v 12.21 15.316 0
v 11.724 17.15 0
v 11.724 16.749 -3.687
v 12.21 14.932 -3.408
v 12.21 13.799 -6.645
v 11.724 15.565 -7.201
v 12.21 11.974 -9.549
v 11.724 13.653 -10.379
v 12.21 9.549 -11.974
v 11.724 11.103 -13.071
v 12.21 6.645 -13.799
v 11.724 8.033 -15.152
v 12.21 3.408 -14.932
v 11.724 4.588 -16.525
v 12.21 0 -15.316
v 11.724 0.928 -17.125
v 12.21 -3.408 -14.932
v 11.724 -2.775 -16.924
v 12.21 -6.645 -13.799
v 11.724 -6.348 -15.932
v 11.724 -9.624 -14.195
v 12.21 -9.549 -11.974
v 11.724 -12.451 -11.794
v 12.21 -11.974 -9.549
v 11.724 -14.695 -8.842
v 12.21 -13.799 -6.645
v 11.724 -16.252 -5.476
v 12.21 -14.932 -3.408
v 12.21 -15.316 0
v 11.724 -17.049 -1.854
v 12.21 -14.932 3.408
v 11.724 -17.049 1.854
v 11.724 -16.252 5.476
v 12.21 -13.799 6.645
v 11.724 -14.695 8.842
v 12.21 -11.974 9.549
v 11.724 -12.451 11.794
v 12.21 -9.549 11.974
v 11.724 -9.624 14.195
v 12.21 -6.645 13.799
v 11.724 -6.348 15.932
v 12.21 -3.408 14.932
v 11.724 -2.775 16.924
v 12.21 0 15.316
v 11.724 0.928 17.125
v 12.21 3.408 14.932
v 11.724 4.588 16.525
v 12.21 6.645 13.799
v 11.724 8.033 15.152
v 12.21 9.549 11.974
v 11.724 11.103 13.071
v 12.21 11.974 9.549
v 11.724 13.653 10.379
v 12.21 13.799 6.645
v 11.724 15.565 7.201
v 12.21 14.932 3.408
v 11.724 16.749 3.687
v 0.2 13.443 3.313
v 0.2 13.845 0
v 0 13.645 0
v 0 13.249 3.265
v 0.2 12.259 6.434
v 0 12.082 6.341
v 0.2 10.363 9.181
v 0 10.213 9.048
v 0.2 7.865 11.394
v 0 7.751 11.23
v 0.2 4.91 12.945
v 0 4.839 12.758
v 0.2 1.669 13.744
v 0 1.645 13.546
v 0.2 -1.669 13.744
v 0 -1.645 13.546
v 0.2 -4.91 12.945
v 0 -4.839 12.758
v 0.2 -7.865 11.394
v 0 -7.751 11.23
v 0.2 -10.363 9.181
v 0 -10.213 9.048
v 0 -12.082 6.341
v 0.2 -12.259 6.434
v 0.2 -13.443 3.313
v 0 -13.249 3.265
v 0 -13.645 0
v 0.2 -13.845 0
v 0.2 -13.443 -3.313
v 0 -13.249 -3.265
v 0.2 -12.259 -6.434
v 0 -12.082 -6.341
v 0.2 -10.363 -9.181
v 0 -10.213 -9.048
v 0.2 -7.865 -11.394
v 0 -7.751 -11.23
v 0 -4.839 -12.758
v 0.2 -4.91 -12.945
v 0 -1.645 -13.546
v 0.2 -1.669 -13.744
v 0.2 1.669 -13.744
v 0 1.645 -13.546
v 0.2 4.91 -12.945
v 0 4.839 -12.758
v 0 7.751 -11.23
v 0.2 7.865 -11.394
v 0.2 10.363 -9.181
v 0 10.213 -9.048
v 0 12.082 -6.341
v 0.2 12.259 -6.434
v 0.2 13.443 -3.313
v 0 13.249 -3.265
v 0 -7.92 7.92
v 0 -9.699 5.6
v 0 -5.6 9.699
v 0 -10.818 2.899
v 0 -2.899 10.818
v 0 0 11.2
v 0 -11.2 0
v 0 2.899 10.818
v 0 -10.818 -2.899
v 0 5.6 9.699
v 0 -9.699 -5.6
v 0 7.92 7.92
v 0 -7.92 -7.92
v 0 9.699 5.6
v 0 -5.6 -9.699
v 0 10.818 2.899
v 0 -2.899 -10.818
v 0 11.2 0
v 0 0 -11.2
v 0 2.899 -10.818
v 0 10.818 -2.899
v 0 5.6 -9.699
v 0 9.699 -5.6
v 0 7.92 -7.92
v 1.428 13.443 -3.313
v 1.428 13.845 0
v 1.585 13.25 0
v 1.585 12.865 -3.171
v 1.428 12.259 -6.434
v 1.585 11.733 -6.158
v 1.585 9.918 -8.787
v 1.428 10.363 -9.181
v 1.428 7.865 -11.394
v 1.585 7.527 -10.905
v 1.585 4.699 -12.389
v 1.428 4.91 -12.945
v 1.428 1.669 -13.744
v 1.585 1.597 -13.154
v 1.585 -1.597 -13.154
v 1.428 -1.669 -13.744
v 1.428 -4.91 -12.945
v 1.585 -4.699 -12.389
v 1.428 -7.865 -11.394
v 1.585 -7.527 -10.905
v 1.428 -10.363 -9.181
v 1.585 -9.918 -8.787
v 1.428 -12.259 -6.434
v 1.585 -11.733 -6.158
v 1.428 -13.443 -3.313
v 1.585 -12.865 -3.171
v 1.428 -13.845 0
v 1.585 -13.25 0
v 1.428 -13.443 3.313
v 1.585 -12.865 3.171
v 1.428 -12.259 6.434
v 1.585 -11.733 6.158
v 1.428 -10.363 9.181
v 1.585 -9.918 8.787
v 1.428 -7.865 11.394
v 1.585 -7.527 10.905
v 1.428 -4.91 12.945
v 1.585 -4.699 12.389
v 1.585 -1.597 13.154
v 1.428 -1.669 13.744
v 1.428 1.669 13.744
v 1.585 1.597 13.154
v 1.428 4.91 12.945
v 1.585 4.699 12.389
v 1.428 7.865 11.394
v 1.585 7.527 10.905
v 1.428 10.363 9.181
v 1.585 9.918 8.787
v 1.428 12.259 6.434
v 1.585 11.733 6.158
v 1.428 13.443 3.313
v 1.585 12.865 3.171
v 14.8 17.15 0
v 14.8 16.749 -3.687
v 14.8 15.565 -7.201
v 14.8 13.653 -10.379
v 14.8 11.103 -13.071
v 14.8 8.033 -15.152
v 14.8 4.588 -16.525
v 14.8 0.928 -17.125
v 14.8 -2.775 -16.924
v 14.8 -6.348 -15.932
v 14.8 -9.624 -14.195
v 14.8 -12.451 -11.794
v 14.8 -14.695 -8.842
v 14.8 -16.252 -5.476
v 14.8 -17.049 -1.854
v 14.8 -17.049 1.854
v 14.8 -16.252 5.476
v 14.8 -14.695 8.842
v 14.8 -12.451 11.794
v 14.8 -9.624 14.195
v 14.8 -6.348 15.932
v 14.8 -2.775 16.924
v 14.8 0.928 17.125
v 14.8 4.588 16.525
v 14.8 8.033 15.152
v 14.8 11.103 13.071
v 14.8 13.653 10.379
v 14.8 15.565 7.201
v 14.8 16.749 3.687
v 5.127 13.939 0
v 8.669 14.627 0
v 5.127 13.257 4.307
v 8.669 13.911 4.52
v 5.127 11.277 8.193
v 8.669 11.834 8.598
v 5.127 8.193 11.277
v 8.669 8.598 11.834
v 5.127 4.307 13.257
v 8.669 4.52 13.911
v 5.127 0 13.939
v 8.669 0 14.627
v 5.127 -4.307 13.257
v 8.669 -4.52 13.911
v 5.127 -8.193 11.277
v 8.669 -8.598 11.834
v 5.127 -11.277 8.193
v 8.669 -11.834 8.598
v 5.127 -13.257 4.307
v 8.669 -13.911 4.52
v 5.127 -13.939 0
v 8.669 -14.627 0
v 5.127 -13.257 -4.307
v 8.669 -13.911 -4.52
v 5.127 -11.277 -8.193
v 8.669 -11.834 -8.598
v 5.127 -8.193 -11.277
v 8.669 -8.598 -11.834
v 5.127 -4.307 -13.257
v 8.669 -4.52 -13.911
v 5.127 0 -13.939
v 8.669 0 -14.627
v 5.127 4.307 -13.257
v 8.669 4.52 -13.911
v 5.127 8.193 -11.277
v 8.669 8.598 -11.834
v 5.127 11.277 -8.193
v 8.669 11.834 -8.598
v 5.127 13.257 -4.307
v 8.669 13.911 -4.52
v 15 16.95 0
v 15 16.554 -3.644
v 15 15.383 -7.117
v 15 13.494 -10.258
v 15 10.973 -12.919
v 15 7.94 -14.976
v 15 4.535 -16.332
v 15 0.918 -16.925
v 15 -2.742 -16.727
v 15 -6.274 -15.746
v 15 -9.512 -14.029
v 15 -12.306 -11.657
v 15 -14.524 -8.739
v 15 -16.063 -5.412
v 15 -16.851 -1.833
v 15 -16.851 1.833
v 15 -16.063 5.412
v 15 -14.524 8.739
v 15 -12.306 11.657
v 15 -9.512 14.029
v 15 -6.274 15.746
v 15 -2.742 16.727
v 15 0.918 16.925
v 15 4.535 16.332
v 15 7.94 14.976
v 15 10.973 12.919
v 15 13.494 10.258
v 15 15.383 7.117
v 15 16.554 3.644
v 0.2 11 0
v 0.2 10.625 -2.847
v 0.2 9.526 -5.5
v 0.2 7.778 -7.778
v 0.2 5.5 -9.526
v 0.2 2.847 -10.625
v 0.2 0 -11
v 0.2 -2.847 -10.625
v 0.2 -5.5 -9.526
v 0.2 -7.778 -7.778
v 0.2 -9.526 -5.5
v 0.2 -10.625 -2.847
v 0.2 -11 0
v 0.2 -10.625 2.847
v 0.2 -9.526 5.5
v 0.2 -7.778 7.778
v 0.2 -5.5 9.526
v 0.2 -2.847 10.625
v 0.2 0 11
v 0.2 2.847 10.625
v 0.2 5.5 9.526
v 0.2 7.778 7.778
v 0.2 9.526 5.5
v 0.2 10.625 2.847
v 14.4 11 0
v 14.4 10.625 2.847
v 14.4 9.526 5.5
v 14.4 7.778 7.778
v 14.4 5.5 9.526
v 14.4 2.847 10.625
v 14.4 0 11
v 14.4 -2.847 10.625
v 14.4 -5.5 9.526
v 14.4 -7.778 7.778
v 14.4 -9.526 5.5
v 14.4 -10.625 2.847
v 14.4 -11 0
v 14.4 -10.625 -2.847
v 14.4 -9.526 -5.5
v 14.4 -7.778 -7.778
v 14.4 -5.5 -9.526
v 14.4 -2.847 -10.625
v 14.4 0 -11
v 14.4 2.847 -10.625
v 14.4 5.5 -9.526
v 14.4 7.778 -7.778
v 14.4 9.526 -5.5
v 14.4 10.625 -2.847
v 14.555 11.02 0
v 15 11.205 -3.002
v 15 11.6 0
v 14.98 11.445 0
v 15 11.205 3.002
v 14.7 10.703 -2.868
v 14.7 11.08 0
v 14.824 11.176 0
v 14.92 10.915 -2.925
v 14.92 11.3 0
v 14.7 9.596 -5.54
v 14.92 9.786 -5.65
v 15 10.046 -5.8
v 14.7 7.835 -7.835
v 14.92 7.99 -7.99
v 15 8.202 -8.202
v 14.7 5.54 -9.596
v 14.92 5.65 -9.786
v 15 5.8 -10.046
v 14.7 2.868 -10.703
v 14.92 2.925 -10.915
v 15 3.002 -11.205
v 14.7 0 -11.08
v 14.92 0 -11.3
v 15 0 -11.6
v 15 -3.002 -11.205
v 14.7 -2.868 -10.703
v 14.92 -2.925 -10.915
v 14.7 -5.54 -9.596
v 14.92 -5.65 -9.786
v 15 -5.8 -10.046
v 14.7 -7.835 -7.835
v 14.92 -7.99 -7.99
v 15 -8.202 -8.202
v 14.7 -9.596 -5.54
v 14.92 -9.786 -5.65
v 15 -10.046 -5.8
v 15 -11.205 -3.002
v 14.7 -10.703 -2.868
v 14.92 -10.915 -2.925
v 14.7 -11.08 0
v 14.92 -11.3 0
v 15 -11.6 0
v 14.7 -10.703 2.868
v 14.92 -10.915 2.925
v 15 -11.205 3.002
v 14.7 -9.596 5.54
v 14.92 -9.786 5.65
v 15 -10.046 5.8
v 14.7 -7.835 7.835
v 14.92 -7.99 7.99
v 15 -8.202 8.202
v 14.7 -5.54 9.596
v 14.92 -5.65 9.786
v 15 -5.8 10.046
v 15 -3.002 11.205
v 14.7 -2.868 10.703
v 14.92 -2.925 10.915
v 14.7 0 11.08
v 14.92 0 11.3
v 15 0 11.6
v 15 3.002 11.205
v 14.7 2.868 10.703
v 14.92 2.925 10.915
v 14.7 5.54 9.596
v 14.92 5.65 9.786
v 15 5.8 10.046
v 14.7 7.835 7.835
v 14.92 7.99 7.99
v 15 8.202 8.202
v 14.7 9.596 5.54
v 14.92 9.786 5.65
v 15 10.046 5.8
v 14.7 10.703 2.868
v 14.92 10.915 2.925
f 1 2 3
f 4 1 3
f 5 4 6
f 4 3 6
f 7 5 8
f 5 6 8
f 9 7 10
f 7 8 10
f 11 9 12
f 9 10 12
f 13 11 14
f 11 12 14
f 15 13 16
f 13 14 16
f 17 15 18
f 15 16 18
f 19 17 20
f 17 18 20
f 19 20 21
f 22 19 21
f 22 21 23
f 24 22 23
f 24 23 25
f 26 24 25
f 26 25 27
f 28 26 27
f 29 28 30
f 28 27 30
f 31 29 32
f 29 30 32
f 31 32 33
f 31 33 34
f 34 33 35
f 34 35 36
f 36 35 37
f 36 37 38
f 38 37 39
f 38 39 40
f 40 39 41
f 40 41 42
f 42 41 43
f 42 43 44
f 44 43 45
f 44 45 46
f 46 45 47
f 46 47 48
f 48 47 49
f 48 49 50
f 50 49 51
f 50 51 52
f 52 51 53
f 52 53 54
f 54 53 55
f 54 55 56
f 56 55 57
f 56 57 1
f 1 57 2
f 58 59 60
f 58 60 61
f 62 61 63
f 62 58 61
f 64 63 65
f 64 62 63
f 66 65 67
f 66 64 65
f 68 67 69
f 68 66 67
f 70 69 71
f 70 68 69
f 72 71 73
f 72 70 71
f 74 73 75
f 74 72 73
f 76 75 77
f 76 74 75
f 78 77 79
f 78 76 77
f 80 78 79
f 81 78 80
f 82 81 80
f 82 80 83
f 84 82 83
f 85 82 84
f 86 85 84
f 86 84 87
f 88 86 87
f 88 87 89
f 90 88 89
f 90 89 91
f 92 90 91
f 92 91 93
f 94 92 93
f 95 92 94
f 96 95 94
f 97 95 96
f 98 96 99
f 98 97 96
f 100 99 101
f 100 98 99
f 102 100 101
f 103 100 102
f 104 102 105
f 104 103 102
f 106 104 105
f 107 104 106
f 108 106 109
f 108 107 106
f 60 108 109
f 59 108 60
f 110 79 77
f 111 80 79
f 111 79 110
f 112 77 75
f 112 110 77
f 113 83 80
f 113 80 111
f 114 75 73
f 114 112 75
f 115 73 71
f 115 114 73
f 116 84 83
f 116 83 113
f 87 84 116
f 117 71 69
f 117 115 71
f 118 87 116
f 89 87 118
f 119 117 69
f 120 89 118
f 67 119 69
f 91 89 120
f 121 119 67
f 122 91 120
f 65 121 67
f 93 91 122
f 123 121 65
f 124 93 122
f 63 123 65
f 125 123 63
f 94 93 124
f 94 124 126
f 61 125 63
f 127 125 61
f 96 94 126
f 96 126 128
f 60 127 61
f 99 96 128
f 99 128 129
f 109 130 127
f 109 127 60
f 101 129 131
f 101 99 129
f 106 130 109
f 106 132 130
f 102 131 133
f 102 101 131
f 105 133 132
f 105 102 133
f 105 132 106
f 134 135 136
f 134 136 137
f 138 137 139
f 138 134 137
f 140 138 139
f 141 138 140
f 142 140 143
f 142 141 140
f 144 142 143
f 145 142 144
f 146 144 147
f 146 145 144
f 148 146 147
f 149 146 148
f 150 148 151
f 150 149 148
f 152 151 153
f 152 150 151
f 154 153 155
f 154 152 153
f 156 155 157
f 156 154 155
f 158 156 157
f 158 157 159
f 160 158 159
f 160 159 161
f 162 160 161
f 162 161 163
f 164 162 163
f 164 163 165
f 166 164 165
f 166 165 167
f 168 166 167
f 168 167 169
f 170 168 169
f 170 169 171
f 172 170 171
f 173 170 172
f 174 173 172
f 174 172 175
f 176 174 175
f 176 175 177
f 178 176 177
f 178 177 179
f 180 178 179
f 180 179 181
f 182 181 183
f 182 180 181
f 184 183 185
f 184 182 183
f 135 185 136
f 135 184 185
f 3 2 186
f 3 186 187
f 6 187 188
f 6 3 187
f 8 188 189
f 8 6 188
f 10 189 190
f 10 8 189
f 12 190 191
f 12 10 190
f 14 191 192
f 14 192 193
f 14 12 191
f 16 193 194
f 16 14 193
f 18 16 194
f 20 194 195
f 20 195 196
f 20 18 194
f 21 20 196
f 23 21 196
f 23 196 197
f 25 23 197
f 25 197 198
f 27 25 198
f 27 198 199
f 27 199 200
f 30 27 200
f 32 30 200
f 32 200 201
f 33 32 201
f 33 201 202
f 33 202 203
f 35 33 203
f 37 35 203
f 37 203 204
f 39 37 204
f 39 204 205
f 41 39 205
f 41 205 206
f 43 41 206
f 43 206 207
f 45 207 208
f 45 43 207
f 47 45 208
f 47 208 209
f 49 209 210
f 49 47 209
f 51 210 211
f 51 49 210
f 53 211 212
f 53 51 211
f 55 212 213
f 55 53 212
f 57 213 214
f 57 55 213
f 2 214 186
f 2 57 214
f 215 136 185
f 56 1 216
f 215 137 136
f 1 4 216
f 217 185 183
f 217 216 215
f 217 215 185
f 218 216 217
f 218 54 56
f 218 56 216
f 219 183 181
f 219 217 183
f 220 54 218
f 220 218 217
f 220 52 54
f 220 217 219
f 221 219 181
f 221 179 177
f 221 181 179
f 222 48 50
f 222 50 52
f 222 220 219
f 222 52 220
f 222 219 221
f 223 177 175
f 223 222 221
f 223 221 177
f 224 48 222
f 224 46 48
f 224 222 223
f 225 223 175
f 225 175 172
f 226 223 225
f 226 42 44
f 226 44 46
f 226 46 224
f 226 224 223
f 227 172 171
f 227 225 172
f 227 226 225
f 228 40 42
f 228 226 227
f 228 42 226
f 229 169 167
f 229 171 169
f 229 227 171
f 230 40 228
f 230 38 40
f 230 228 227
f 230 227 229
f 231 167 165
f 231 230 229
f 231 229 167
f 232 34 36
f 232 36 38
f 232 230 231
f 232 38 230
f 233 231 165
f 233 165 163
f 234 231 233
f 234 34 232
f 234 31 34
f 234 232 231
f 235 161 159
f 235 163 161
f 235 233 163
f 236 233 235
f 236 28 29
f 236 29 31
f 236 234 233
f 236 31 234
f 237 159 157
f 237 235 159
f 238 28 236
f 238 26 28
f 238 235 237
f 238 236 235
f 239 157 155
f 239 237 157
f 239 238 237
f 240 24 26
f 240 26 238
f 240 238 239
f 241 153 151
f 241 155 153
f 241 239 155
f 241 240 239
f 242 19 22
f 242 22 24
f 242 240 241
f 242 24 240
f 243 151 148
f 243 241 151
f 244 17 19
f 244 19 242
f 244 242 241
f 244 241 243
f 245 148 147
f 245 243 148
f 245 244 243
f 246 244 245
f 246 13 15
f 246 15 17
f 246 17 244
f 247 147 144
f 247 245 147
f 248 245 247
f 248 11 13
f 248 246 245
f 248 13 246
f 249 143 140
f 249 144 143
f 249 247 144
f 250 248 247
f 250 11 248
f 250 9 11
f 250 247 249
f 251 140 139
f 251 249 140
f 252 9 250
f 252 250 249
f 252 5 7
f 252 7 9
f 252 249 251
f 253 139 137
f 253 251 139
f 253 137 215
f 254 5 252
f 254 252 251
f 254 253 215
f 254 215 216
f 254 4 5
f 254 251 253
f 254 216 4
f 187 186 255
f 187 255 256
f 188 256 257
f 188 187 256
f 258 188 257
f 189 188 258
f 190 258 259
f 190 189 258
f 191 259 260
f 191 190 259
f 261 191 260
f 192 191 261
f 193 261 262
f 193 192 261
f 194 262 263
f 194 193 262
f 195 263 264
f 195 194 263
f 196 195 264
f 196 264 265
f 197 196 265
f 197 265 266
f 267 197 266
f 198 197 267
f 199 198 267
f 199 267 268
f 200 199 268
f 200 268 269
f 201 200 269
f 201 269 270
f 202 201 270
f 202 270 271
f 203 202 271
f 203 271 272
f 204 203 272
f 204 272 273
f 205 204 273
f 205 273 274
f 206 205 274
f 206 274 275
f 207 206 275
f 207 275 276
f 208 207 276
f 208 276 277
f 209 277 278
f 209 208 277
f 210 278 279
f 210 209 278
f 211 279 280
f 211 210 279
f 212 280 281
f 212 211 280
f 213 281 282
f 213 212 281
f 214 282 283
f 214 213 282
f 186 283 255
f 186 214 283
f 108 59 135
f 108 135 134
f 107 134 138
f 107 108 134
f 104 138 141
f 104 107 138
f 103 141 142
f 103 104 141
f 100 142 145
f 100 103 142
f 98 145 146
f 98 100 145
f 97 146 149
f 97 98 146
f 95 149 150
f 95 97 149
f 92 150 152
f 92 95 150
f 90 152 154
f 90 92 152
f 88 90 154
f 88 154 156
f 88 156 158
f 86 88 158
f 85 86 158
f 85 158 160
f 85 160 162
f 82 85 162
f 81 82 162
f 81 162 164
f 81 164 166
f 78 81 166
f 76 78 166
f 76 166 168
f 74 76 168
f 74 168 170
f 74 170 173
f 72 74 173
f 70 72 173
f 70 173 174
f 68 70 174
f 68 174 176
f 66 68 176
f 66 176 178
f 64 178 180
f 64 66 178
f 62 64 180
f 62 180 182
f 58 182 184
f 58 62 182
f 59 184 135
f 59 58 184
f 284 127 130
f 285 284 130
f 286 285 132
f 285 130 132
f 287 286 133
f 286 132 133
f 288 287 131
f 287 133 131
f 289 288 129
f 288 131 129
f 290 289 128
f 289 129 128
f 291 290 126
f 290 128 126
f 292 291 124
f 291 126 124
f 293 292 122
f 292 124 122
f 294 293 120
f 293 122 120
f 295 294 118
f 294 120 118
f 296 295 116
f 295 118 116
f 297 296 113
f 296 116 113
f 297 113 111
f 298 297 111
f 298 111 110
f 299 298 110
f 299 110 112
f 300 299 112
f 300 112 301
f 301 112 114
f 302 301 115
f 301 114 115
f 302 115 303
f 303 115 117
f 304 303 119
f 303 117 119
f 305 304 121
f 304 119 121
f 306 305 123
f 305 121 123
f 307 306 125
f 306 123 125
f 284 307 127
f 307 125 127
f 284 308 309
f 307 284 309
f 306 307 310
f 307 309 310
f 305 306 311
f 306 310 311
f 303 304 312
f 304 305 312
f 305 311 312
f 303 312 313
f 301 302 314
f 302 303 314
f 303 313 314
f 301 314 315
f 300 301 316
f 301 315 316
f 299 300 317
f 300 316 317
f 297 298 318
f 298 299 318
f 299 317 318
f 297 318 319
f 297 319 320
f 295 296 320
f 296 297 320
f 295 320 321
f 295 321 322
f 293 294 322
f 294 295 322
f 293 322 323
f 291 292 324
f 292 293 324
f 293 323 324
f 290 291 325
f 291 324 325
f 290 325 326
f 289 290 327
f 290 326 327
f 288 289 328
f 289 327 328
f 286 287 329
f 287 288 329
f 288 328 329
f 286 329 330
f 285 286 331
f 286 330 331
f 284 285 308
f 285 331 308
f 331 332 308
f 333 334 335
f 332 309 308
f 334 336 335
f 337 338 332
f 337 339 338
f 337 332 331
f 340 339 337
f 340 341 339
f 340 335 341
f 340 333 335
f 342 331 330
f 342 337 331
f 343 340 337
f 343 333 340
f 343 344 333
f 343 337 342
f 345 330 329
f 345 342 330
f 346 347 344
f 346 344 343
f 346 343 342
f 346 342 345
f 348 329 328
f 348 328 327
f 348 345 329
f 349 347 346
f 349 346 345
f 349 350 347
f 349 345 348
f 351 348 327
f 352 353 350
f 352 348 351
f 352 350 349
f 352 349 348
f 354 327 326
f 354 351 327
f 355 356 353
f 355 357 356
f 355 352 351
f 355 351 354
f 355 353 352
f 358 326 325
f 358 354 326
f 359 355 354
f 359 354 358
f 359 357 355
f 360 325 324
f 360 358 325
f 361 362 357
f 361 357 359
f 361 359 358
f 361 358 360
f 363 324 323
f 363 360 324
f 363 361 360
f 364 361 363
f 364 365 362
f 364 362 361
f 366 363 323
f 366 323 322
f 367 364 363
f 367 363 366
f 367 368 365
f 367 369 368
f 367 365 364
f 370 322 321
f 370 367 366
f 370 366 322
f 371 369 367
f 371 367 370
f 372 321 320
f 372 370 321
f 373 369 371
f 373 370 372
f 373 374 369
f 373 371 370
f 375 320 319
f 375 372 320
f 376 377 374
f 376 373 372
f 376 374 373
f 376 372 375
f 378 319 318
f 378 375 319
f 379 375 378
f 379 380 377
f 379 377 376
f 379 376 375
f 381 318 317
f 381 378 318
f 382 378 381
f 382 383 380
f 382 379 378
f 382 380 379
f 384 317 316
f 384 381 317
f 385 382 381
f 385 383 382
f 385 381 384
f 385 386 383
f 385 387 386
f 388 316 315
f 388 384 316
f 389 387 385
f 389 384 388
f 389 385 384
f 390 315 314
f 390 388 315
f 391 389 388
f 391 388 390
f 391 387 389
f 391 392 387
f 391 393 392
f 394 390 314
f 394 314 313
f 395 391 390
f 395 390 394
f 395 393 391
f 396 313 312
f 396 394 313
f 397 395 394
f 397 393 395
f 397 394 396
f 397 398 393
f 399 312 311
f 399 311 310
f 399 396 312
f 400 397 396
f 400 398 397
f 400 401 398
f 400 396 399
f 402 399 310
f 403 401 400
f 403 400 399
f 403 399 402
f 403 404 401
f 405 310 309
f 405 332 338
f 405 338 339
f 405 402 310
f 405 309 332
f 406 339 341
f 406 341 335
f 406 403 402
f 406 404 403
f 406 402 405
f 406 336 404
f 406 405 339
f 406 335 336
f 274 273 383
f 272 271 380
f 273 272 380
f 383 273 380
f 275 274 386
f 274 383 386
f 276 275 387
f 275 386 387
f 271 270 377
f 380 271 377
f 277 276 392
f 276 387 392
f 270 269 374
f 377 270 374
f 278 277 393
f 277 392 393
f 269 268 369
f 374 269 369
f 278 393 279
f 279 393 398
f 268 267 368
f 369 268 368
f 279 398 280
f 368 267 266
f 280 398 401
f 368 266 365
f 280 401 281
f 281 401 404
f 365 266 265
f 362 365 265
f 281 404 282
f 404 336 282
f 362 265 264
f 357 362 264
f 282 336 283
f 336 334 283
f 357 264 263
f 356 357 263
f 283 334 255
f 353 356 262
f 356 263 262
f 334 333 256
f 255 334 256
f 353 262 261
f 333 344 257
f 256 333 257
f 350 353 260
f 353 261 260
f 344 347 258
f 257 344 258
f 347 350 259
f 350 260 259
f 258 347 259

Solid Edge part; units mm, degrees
sketch "Sketch1" plane through (0, 0, 0) normal (0, 0, 1) x (1, 0, 0)
  line L0 (0, 11.2) -> (0.2, 11)
  line L1 (0.2, 11) -> (14.4, 11)
  arc A0 (14.4, 11) -> (15, 11.6) centre (14.4, 11.6) ccw
  line L2 (15, 11.6) -> (15, 16.95)
  line L3 (15, 16.95) -> (14.8, 17.15)
  line L4 (14.8, 17.15) -> (11.7245, 17.15)
  line L5 (11.7245, 17.15) -> (12.2103, 15.3157)
  line L6 (12.2103, 15.3157) -> (1.585, 13.2504)
  line L7 (1.585, 13.2504) -> (1.4275, 13.845)
  line L8 (1.4275, 13.845) -> (0.2, 13.845)
  line L9 (0.2, 13.845) -> (0, 13.645)
  line L10 (0, 13.645) -> (0, 11.2)
revolve "RevolvedProtrusion1" add sketch "Sketch1" angle 360 about axis through (15, 0, 0) along (-1, 0, 0)
properties part number "320/22 X_ir"
